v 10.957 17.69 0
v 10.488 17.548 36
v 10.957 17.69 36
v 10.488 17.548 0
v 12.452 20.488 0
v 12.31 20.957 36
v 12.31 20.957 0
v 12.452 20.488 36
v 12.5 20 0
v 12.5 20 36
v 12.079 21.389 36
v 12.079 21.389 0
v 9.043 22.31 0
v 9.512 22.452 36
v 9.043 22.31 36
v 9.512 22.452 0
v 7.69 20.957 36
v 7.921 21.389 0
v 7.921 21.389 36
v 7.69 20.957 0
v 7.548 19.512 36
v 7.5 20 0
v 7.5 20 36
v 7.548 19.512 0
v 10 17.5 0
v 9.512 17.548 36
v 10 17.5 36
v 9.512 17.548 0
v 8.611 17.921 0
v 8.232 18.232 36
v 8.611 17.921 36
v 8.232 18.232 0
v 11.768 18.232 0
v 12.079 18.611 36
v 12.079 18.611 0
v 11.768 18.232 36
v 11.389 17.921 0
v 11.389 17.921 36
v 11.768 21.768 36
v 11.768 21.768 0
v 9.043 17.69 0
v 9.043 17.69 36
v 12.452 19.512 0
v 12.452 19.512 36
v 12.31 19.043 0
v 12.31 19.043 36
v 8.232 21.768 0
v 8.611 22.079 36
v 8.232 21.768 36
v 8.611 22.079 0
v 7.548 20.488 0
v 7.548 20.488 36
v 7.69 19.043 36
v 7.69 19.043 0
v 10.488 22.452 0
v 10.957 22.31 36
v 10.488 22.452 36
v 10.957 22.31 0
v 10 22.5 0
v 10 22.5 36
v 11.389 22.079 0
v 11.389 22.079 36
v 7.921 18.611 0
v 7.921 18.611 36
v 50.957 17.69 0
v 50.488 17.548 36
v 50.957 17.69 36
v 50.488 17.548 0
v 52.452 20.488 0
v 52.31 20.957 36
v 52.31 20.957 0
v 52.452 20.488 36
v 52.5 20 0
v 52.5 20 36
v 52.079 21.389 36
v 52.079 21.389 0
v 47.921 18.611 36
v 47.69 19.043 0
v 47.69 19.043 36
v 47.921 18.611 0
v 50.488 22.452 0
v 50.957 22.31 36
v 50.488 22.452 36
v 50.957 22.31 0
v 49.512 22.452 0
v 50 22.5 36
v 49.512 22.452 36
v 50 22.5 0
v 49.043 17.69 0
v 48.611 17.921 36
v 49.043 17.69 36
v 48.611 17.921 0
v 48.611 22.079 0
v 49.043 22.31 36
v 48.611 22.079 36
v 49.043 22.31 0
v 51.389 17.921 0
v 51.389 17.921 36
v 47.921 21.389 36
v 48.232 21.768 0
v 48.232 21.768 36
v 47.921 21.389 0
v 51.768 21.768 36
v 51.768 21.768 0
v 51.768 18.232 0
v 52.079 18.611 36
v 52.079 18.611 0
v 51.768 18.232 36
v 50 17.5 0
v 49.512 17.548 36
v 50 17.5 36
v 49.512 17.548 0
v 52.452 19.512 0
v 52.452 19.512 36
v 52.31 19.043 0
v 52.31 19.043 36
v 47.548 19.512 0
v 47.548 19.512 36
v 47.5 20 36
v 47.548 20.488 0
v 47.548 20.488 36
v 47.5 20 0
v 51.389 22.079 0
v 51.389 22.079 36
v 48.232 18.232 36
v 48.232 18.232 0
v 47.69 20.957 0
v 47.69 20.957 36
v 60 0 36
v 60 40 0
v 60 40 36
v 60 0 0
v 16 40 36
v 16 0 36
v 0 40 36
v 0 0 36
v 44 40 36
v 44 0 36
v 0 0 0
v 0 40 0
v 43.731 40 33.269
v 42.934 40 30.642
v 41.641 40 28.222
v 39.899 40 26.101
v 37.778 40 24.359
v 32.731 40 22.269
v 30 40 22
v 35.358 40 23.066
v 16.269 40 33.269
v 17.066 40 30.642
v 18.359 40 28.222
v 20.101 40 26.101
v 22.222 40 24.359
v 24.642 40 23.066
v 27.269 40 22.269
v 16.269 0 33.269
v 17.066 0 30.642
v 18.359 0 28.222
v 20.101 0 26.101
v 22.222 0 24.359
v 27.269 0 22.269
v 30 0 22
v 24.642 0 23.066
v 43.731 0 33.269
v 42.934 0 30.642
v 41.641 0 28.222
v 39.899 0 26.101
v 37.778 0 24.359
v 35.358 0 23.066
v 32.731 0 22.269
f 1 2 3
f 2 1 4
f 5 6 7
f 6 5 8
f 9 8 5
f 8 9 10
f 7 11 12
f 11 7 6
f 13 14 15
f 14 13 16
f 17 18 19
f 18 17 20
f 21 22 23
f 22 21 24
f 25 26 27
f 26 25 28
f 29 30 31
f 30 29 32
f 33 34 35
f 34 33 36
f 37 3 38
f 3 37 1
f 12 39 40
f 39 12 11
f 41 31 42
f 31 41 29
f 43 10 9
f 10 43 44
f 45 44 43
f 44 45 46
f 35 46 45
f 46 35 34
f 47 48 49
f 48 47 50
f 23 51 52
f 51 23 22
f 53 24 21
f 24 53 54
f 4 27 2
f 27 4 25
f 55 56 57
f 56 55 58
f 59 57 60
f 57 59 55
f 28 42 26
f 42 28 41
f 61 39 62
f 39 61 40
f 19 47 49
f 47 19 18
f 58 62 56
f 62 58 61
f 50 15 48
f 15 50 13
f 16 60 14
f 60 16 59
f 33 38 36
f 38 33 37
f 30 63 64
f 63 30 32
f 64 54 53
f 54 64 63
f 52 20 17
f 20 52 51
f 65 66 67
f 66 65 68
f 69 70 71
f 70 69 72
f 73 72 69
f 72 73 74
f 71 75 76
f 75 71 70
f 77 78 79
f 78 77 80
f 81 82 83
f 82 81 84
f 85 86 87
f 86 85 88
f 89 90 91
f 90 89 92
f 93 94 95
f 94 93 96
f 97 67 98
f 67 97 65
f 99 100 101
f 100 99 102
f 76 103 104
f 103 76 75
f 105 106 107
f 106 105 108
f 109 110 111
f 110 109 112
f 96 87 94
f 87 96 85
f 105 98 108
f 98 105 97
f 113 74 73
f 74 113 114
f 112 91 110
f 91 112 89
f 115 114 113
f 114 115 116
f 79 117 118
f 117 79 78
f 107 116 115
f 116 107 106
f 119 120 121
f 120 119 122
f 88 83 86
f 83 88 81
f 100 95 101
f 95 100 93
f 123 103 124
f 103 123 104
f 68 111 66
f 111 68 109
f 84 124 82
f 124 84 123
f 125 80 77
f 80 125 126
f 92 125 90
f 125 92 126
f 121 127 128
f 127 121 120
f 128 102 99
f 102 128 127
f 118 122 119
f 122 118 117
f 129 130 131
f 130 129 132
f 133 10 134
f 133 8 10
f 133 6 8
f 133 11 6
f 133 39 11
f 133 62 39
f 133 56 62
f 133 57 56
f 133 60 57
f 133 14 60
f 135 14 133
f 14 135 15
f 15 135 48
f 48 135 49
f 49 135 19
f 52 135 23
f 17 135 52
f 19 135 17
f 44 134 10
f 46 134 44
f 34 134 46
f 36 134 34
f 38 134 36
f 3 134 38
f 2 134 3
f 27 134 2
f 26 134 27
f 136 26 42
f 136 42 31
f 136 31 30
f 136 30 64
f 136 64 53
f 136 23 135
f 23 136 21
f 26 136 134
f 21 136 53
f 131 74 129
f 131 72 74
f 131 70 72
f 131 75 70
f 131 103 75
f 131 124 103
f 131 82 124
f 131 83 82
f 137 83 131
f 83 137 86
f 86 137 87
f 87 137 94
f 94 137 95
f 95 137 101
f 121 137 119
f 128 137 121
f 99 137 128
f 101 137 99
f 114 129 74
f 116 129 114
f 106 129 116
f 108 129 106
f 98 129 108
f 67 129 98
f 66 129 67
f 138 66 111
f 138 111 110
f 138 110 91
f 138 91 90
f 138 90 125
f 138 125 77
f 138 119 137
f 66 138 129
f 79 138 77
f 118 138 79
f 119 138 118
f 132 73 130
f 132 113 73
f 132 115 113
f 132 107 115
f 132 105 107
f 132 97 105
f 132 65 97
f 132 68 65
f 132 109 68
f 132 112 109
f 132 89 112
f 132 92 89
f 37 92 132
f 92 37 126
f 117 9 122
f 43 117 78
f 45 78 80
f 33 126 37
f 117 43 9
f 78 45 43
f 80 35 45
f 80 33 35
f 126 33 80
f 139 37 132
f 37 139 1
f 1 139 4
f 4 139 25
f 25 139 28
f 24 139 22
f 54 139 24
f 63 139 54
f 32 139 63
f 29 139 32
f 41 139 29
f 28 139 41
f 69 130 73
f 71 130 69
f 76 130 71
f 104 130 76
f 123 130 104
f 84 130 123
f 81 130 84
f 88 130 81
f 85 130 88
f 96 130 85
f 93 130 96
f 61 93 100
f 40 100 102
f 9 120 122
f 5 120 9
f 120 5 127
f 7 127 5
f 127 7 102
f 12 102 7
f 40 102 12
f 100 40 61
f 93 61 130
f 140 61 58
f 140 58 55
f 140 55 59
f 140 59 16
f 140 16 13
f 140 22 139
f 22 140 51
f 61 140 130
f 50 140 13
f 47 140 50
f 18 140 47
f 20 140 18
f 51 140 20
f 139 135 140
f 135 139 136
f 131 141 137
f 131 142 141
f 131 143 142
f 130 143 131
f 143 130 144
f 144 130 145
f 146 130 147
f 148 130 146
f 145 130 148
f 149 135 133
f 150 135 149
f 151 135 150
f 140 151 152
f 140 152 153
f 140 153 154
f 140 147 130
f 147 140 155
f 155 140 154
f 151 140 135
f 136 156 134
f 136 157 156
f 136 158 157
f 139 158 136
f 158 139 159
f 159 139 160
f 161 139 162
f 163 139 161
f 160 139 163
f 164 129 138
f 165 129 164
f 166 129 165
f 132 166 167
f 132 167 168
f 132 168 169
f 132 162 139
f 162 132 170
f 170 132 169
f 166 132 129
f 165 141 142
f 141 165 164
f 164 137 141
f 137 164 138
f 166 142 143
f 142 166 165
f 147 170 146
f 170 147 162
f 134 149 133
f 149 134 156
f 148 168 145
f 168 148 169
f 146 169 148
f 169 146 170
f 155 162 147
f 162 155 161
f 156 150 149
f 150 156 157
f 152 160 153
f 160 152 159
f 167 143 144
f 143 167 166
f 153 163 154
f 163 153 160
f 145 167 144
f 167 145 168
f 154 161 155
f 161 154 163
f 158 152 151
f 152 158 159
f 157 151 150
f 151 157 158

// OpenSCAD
$fn = 32;

// ----------------------------------------------------------------------
// Saddle clamp: plain shaft clamp
// ----------------------------------------------------------------------

// --- parameters (mm) ---
blk_l = 60;               // block length, X
blk_w = 40;               // block width, Y
blk_h = 36;               // block height
clamp_r = 14;             // shaft groove radius
hole_r = 2.5;             // bolt hole radius
hole_m = 10;              // bolt hole margin from the ends
fit_tol = 0.1;            // tolerance for press fits, mm
free_tol = 0.3;           // tolerance for clearance fits, mm

saw_depth = clamp_r + 3;  // saw kerf depth

difference() {
  cube([blk_l, blk_w, blk_h]);
  translate([blk_l / 2, -1, blk_h])
    rotate([-90, 0, 0])
      cylinder(h = blk_w + 2, r = clamp_r);
  for (sx = [0, 1])
    translate([sx ? blk_l - hole_m : hole_m, blk_w / 2, -1])
      cylinder(r = hole_r, h = blk_h + 2);
}
